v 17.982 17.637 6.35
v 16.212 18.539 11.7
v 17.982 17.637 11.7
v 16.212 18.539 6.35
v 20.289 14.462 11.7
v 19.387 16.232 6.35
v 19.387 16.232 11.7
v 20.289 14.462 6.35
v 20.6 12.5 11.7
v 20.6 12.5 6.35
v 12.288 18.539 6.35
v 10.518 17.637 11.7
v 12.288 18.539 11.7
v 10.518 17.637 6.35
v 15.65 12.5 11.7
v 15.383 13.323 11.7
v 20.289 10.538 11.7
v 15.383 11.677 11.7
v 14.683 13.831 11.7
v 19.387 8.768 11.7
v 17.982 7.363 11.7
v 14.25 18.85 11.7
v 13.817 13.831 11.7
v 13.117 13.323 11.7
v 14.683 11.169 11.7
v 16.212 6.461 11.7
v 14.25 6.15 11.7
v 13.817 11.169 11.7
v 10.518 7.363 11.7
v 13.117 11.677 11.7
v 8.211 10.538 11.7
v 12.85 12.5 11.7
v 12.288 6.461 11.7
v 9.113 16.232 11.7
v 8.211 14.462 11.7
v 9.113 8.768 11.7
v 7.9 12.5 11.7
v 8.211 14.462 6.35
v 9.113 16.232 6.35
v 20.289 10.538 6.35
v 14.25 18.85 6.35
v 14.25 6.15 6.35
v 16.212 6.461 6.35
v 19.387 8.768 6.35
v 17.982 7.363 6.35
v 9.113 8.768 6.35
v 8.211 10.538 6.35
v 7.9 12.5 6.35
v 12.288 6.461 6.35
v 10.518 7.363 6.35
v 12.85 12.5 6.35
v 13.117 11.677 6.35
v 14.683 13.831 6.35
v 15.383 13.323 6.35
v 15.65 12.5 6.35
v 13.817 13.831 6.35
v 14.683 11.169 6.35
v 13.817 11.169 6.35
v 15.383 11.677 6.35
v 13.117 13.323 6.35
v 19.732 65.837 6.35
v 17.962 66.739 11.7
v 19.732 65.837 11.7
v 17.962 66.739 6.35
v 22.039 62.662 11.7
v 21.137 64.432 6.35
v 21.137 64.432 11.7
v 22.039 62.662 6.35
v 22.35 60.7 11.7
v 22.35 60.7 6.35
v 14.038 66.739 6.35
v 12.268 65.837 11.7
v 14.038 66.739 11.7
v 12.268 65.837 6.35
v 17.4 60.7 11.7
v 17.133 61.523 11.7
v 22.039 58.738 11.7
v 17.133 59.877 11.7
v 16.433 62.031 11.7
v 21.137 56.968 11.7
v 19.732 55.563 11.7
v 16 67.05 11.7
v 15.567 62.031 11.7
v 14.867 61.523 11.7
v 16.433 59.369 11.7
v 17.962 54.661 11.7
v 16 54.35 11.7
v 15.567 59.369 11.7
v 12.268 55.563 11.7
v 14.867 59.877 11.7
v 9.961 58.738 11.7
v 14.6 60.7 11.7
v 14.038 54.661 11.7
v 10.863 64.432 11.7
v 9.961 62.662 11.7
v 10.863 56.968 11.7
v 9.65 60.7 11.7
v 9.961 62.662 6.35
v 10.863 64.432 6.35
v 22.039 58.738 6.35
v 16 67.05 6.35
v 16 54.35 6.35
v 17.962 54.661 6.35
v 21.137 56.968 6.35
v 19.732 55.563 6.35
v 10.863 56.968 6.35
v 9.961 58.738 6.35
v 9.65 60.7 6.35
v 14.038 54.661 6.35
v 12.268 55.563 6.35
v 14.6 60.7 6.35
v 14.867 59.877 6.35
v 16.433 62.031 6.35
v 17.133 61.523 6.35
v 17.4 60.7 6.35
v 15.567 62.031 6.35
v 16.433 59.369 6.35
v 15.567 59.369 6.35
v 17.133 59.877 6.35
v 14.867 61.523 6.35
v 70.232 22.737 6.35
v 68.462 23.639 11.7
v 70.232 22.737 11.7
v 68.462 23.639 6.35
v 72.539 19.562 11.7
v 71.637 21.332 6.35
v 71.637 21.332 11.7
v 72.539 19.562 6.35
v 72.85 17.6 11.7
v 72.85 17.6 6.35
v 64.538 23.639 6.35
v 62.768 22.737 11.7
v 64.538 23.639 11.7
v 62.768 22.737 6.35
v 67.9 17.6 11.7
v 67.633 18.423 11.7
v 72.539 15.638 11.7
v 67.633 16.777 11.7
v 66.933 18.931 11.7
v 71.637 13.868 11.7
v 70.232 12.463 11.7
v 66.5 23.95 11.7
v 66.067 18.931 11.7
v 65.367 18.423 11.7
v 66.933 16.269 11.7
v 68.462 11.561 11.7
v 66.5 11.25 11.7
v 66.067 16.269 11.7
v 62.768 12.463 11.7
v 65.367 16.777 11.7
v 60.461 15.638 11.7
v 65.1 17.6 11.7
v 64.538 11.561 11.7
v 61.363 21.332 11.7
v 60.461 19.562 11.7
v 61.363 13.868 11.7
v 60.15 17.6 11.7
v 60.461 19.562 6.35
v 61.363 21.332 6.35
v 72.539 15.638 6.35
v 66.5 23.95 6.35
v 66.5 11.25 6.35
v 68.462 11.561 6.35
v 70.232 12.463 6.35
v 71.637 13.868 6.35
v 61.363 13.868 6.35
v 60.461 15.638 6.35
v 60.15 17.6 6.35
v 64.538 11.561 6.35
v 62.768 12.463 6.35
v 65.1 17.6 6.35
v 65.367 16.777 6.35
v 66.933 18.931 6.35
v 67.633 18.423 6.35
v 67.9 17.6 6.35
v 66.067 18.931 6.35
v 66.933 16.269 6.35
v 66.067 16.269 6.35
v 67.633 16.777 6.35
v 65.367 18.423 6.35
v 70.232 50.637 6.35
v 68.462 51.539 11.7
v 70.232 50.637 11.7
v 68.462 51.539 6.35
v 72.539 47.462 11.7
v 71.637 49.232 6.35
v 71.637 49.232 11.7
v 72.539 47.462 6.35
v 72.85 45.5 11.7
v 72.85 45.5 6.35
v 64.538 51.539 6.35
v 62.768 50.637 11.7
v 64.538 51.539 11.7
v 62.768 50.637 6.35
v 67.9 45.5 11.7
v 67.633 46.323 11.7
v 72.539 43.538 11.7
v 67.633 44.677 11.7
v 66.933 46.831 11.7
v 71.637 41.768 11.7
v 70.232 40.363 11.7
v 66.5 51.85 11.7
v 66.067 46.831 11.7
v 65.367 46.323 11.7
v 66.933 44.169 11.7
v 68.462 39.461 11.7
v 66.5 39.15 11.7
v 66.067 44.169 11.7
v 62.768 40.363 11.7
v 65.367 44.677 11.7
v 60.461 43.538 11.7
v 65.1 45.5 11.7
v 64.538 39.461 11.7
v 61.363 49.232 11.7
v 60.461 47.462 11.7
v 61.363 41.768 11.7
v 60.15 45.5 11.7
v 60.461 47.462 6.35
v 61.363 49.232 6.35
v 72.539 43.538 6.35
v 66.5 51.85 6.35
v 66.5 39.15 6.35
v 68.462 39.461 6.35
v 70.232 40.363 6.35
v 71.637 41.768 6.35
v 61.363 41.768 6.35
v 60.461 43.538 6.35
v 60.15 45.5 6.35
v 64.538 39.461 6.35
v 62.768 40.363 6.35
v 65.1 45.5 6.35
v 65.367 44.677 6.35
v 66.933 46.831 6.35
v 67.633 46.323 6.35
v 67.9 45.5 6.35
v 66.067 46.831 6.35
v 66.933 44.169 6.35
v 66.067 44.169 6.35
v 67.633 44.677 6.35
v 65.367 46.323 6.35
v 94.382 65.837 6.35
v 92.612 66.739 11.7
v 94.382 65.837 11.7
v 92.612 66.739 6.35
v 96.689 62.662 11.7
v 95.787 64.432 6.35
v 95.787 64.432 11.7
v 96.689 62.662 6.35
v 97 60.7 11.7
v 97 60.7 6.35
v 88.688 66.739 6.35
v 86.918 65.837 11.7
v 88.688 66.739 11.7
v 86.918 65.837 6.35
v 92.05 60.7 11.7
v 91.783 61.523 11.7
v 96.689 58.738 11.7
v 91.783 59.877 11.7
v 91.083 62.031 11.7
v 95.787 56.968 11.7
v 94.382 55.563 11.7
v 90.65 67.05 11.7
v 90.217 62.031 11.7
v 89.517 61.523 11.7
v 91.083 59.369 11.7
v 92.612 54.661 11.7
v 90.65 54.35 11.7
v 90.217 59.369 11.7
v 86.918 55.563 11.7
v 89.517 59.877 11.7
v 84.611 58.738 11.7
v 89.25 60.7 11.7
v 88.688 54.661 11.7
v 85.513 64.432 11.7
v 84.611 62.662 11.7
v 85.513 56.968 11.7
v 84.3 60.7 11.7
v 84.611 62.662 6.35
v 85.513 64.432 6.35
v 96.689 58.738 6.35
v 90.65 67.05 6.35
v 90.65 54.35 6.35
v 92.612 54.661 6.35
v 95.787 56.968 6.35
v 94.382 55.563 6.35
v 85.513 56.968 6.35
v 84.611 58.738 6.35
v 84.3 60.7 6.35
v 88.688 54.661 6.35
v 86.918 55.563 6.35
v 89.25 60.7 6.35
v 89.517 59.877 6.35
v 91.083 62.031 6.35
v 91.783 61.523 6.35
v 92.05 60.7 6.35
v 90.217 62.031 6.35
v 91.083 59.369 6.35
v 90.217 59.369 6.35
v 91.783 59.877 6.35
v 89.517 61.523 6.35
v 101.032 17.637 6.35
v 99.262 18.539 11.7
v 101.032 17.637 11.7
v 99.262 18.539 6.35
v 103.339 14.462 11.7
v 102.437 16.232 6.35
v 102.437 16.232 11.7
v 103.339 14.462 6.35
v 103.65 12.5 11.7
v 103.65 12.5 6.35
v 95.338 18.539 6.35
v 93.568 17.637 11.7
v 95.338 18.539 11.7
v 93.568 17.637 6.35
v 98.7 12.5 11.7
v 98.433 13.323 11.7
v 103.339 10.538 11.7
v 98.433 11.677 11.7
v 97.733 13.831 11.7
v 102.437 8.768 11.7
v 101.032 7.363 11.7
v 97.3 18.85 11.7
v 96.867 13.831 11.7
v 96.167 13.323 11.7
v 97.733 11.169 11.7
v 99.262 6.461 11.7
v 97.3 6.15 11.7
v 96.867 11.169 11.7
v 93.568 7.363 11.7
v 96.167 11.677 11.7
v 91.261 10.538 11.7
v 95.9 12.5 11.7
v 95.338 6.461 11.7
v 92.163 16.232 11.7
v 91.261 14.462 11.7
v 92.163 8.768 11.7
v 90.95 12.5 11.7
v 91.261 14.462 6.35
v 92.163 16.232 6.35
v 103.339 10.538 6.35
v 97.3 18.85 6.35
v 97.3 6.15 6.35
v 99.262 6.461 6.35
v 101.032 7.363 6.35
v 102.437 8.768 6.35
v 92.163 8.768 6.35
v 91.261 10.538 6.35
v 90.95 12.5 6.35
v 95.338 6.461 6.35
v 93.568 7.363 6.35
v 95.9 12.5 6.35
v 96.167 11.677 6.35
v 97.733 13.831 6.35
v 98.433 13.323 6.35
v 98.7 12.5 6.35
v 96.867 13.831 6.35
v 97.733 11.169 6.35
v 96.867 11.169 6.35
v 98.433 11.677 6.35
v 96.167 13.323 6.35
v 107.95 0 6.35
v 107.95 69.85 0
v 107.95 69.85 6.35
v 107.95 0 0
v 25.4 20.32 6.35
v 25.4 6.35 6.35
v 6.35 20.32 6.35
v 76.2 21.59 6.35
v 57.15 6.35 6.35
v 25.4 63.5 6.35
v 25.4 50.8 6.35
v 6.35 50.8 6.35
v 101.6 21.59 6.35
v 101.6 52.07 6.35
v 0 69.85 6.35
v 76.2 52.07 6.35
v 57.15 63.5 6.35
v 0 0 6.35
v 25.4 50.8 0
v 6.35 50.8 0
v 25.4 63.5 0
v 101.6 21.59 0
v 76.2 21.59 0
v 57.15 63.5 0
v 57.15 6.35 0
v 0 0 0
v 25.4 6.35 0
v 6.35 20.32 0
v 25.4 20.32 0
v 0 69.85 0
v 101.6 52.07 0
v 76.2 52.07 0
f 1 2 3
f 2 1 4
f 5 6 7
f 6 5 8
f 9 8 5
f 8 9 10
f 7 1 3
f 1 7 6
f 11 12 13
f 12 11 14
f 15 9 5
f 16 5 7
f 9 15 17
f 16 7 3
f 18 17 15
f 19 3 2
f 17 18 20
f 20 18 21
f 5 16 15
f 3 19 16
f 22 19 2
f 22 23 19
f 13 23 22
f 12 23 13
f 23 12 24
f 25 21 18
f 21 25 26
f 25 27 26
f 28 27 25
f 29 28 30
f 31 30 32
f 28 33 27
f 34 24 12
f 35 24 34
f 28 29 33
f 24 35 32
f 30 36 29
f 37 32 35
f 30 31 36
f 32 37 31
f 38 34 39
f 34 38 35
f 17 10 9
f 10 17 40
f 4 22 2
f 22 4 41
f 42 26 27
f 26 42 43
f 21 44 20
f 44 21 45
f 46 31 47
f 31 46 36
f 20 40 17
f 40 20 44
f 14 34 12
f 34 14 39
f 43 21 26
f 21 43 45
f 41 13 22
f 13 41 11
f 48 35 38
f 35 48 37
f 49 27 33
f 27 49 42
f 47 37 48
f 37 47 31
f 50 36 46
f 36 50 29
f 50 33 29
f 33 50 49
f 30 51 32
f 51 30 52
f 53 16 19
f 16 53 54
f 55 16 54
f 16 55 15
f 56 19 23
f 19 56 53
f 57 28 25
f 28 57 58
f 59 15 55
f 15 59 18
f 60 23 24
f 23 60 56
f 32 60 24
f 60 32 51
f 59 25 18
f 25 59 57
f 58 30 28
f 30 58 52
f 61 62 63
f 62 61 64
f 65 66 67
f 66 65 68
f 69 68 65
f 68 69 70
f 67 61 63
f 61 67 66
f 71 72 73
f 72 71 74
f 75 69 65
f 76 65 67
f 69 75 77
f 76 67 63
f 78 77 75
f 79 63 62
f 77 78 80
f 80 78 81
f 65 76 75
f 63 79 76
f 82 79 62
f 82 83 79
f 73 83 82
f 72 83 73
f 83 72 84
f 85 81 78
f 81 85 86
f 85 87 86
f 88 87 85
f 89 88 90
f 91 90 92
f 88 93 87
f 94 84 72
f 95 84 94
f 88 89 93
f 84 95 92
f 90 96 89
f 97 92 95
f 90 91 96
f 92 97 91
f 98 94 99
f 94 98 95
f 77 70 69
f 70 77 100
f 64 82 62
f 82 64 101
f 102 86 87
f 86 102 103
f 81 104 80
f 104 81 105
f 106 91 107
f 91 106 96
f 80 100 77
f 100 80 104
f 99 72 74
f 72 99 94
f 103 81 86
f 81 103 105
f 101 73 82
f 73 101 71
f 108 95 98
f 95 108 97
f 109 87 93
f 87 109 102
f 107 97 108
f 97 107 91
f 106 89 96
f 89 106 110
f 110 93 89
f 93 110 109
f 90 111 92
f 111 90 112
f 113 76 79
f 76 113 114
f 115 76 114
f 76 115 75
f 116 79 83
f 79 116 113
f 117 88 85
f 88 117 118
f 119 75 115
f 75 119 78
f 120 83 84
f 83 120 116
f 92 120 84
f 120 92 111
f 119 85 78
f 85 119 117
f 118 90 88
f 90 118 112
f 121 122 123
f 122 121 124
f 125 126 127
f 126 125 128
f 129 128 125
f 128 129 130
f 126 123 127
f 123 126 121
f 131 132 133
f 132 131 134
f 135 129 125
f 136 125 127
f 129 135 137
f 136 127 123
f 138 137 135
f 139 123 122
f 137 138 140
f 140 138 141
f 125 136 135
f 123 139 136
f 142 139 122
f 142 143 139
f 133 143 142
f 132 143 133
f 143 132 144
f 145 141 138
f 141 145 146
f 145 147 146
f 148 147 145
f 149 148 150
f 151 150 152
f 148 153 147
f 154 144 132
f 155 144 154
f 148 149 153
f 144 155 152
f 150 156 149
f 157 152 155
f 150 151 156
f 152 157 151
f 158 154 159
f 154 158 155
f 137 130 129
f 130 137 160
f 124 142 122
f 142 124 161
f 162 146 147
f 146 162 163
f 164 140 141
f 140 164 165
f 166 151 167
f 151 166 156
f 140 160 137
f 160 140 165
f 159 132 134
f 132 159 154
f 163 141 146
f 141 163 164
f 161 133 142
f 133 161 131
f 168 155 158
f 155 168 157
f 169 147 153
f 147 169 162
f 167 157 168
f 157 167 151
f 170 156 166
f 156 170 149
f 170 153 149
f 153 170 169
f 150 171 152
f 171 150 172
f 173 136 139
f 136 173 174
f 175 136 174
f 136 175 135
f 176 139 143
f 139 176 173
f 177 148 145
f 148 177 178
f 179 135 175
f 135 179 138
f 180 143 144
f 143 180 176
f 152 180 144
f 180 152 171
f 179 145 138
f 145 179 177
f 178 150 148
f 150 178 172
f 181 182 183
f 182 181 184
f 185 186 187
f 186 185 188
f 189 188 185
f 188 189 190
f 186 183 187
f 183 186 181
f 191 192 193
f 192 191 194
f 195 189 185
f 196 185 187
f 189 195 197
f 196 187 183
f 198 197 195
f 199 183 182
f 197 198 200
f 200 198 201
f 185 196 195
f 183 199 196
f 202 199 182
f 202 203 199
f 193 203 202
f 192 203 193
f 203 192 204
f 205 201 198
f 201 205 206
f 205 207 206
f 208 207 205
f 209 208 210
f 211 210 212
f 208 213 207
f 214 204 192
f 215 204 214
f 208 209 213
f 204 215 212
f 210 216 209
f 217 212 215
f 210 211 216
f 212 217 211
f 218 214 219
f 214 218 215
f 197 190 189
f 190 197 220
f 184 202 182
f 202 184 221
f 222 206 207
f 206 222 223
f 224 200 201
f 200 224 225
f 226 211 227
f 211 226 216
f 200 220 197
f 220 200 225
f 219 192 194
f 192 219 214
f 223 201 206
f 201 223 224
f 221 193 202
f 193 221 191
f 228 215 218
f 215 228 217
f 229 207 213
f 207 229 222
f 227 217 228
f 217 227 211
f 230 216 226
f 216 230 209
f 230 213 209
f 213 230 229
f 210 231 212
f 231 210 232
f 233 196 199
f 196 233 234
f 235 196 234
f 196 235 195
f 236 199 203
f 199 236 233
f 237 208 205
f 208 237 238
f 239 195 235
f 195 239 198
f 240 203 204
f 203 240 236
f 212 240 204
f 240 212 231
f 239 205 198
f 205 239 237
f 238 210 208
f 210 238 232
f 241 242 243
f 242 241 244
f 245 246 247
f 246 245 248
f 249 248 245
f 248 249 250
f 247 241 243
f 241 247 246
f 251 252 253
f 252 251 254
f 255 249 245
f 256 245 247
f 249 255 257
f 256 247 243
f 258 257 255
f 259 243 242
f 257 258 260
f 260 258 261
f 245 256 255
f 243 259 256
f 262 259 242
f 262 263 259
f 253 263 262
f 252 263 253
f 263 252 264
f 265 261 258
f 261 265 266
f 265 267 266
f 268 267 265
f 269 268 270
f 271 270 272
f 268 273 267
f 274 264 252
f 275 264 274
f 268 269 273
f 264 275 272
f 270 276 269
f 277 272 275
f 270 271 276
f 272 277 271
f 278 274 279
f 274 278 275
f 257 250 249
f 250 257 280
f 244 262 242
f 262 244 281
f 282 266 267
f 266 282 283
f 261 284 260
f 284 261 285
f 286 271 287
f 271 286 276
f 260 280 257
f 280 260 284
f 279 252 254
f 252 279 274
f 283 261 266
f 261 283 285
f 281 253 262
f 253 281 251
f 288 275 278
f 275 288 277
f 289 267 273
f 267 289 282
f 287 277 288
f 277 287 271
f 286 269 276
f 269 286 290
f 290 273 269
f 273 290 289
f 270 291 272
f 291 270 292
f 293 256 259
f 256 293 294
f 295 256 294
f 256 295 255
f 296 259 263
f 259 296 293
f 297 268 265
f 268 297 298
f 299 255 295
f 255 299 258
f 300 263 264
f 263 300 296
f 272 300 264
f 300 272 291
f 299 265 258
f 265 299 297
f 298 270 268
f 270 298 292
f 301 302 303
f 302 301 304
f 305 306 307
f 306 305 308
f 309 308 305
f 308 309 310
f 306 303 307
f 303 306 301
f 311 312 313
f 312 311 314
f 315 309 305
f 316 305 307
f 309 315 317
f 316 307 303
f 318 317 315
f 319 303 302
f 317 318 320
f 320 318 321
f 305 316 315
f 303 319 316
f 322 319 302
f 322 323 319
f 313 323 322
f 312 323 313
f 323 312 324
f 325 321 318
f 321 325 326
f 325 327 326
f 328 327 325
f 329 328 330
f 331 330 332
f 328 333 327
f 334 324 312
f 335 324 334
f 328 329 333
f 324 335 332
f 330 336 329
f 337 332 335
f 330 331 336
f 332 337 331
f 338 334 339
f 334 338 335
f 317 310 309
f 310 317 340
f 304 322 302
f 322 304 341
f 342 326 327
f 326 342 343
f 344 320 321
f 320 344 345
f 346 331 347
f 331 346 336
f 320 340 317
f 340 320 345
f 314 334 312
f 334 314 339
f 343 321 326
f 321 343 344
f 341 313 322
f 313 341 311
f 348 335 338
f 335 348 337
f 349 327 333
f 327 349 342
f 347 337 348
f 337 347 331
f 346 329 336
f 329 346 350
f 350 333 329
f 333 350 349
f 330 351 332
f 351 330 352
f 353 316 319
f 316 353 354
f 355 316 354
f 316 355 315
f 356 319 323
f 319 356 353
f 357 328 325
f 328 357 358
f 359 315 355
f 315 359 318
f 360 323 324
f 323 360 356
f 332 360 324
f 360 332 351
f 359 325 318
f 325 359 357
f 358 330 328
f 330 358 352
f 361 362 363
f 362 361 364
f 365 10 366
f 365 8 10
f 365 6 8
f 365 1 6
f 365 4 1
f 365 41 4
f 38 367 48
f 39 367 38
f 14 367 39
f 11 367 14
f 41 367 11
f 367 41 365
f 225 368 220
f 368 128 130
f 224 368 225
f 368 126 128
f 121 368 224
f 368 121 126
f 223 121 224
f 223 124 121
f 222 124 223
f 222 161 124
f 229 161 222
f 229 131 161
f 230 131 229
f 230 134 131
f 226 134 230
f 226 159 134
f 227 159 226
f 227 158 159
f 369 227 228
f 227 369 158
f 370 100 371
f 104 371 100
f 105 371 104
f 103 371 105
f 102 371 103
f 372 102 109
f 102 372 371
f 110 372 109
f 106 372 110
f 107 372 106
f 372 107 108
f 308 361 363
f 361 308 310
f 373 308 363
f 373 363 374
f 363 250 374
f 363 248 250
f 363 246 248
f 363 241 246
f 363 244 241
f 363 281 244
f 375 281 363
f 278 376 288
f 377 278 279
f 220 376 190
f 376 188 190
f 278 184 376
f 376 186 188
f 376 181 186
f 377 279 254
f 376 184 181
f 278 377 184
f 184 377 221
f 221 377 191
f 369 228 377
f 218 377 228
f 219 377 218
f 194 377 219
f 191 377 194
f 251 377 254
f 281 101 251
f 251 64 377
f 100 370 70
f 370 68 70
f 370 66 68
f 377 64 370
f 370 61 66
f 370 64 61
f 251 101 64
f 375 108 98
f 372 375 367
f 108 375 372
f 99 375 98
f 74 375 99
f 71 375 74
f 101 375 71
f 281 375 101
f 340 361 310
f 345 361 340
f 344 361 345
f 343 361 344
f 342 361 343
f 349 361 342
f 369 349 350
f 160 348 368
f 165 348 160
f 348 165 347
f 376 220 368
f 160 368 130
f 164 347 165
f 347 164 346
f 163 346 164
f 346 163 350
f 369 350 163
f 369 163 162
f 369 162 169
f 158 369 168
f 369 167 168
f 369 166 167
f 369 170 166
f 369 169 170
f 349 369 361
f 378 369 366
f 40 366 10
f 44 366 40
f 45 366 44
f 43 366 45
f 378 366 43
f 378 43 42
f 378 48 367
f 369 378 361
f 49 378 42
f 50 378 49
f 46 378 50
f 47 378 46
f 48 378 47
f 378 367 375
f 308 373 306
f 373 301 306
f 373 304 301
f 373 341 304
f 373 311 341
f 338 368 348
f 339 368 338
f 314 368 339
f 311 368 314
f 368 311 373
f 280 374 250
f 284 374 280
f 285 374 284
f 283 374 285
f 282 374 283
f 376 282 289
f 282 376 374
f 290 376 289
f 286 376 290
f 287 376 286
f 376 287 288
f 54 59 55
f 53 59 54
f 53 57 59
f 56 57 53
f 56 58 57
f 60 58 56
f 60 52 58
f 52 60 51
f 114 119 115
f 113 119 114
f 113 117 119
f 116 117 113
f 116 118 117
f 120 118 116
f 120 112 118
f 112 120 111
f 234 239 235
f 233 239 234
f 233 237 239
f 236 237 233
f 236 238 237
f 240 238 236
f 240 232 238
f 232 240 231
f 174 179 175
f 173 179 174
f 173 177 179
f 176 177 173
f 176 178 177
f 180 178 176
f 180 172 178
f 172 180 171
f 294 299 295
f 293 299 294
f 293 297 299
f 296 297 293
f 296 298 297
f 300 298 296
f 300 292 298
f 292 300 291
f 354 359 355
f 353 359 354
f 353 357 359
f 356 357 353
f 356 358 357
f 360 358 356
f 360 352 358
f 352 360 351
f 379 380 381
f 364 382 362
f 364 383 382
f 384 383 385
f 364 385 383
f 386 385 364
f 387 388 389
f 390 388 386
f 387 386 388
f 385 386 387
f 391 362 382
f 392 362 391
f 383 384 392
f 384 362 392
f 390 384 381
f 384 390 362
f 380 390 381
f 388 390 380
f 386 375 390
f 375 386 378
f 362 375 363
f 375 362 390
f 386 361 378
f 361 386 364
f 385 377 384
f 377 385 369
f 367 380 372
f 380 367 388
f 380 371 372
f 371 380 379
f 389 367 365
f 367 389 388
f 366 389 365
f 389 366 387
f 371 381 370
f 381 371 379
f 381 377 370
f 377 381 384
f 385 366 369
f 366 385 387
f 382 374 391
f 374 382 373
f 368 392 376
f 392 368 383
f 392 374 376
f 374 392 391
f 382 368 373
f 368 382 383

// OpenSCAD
// Dimensions
totalWidth = 190.5; // 7.5"
totalLength = 190.5;
inch = 25.4;
halfInch = inch / 2;
quarterInch = inch / 4; // .25"
floorDepth = quarterInch;   // Real = .25 inches
edgeWidth = quarterInch;
bossHeight = quarterInch;
cavityDepth = 0.1 * inch;       // Real = 2 inches
boltRadius = 1.4;
dividerHeight = 56;
dividerDepth = inch;

$fn = 10;

// Boss
module boss(x, y)
{
    translate ([x, y, floorDepth + (bossHeight / 2) - 1])
    {
        difference()
        {
            cylinder(h = bossHeight, r = quarterInch, center = true, $fn = 20);
            cylinder(h = bossHeight + 1, r = boltRadius, center = true, $fn = 10);
        }
    }
}

difference()
{
    union()
    {
        cube([4.25 * inch, 2.75 * inch, floorDepth], false);

        // Arduino
        translate([0, 10, 0])
        {
            boss (14.25, 2.5); //  lower left
            boss (16,             2.5 + 5.1 + 27.9 + 15.2); // top left
            boss (14    + 52.5,        2.5 + 5.1); // lower Uno hole
            boss (14    + 52.5,        2.5 + 5.1 + 27.9); // upper Uno hole
            boss (14.05 + 52.5 + 24.1, 2.5 + 5.1 + 27.9 + 15.2); // upper right
            boss (12.00 + 85.3,        2.5); // lower right
        }
    }
    
    translate ([.25 * inch, .8 * inch, -10])
    {
        cube ([2 * inch, 1.2 * inch, inch], false);
    }
        
    translate ([inch, 0.25 * inch, -10])
    {
        cube ([1.25 * inch, 2.25 * inch, inch], false);
    }
    
    translate ([3 * inch, .85 * inch, -10])
    {
        cube ([1 * inch, 1.2 * inch, inch], false);
    }
}
